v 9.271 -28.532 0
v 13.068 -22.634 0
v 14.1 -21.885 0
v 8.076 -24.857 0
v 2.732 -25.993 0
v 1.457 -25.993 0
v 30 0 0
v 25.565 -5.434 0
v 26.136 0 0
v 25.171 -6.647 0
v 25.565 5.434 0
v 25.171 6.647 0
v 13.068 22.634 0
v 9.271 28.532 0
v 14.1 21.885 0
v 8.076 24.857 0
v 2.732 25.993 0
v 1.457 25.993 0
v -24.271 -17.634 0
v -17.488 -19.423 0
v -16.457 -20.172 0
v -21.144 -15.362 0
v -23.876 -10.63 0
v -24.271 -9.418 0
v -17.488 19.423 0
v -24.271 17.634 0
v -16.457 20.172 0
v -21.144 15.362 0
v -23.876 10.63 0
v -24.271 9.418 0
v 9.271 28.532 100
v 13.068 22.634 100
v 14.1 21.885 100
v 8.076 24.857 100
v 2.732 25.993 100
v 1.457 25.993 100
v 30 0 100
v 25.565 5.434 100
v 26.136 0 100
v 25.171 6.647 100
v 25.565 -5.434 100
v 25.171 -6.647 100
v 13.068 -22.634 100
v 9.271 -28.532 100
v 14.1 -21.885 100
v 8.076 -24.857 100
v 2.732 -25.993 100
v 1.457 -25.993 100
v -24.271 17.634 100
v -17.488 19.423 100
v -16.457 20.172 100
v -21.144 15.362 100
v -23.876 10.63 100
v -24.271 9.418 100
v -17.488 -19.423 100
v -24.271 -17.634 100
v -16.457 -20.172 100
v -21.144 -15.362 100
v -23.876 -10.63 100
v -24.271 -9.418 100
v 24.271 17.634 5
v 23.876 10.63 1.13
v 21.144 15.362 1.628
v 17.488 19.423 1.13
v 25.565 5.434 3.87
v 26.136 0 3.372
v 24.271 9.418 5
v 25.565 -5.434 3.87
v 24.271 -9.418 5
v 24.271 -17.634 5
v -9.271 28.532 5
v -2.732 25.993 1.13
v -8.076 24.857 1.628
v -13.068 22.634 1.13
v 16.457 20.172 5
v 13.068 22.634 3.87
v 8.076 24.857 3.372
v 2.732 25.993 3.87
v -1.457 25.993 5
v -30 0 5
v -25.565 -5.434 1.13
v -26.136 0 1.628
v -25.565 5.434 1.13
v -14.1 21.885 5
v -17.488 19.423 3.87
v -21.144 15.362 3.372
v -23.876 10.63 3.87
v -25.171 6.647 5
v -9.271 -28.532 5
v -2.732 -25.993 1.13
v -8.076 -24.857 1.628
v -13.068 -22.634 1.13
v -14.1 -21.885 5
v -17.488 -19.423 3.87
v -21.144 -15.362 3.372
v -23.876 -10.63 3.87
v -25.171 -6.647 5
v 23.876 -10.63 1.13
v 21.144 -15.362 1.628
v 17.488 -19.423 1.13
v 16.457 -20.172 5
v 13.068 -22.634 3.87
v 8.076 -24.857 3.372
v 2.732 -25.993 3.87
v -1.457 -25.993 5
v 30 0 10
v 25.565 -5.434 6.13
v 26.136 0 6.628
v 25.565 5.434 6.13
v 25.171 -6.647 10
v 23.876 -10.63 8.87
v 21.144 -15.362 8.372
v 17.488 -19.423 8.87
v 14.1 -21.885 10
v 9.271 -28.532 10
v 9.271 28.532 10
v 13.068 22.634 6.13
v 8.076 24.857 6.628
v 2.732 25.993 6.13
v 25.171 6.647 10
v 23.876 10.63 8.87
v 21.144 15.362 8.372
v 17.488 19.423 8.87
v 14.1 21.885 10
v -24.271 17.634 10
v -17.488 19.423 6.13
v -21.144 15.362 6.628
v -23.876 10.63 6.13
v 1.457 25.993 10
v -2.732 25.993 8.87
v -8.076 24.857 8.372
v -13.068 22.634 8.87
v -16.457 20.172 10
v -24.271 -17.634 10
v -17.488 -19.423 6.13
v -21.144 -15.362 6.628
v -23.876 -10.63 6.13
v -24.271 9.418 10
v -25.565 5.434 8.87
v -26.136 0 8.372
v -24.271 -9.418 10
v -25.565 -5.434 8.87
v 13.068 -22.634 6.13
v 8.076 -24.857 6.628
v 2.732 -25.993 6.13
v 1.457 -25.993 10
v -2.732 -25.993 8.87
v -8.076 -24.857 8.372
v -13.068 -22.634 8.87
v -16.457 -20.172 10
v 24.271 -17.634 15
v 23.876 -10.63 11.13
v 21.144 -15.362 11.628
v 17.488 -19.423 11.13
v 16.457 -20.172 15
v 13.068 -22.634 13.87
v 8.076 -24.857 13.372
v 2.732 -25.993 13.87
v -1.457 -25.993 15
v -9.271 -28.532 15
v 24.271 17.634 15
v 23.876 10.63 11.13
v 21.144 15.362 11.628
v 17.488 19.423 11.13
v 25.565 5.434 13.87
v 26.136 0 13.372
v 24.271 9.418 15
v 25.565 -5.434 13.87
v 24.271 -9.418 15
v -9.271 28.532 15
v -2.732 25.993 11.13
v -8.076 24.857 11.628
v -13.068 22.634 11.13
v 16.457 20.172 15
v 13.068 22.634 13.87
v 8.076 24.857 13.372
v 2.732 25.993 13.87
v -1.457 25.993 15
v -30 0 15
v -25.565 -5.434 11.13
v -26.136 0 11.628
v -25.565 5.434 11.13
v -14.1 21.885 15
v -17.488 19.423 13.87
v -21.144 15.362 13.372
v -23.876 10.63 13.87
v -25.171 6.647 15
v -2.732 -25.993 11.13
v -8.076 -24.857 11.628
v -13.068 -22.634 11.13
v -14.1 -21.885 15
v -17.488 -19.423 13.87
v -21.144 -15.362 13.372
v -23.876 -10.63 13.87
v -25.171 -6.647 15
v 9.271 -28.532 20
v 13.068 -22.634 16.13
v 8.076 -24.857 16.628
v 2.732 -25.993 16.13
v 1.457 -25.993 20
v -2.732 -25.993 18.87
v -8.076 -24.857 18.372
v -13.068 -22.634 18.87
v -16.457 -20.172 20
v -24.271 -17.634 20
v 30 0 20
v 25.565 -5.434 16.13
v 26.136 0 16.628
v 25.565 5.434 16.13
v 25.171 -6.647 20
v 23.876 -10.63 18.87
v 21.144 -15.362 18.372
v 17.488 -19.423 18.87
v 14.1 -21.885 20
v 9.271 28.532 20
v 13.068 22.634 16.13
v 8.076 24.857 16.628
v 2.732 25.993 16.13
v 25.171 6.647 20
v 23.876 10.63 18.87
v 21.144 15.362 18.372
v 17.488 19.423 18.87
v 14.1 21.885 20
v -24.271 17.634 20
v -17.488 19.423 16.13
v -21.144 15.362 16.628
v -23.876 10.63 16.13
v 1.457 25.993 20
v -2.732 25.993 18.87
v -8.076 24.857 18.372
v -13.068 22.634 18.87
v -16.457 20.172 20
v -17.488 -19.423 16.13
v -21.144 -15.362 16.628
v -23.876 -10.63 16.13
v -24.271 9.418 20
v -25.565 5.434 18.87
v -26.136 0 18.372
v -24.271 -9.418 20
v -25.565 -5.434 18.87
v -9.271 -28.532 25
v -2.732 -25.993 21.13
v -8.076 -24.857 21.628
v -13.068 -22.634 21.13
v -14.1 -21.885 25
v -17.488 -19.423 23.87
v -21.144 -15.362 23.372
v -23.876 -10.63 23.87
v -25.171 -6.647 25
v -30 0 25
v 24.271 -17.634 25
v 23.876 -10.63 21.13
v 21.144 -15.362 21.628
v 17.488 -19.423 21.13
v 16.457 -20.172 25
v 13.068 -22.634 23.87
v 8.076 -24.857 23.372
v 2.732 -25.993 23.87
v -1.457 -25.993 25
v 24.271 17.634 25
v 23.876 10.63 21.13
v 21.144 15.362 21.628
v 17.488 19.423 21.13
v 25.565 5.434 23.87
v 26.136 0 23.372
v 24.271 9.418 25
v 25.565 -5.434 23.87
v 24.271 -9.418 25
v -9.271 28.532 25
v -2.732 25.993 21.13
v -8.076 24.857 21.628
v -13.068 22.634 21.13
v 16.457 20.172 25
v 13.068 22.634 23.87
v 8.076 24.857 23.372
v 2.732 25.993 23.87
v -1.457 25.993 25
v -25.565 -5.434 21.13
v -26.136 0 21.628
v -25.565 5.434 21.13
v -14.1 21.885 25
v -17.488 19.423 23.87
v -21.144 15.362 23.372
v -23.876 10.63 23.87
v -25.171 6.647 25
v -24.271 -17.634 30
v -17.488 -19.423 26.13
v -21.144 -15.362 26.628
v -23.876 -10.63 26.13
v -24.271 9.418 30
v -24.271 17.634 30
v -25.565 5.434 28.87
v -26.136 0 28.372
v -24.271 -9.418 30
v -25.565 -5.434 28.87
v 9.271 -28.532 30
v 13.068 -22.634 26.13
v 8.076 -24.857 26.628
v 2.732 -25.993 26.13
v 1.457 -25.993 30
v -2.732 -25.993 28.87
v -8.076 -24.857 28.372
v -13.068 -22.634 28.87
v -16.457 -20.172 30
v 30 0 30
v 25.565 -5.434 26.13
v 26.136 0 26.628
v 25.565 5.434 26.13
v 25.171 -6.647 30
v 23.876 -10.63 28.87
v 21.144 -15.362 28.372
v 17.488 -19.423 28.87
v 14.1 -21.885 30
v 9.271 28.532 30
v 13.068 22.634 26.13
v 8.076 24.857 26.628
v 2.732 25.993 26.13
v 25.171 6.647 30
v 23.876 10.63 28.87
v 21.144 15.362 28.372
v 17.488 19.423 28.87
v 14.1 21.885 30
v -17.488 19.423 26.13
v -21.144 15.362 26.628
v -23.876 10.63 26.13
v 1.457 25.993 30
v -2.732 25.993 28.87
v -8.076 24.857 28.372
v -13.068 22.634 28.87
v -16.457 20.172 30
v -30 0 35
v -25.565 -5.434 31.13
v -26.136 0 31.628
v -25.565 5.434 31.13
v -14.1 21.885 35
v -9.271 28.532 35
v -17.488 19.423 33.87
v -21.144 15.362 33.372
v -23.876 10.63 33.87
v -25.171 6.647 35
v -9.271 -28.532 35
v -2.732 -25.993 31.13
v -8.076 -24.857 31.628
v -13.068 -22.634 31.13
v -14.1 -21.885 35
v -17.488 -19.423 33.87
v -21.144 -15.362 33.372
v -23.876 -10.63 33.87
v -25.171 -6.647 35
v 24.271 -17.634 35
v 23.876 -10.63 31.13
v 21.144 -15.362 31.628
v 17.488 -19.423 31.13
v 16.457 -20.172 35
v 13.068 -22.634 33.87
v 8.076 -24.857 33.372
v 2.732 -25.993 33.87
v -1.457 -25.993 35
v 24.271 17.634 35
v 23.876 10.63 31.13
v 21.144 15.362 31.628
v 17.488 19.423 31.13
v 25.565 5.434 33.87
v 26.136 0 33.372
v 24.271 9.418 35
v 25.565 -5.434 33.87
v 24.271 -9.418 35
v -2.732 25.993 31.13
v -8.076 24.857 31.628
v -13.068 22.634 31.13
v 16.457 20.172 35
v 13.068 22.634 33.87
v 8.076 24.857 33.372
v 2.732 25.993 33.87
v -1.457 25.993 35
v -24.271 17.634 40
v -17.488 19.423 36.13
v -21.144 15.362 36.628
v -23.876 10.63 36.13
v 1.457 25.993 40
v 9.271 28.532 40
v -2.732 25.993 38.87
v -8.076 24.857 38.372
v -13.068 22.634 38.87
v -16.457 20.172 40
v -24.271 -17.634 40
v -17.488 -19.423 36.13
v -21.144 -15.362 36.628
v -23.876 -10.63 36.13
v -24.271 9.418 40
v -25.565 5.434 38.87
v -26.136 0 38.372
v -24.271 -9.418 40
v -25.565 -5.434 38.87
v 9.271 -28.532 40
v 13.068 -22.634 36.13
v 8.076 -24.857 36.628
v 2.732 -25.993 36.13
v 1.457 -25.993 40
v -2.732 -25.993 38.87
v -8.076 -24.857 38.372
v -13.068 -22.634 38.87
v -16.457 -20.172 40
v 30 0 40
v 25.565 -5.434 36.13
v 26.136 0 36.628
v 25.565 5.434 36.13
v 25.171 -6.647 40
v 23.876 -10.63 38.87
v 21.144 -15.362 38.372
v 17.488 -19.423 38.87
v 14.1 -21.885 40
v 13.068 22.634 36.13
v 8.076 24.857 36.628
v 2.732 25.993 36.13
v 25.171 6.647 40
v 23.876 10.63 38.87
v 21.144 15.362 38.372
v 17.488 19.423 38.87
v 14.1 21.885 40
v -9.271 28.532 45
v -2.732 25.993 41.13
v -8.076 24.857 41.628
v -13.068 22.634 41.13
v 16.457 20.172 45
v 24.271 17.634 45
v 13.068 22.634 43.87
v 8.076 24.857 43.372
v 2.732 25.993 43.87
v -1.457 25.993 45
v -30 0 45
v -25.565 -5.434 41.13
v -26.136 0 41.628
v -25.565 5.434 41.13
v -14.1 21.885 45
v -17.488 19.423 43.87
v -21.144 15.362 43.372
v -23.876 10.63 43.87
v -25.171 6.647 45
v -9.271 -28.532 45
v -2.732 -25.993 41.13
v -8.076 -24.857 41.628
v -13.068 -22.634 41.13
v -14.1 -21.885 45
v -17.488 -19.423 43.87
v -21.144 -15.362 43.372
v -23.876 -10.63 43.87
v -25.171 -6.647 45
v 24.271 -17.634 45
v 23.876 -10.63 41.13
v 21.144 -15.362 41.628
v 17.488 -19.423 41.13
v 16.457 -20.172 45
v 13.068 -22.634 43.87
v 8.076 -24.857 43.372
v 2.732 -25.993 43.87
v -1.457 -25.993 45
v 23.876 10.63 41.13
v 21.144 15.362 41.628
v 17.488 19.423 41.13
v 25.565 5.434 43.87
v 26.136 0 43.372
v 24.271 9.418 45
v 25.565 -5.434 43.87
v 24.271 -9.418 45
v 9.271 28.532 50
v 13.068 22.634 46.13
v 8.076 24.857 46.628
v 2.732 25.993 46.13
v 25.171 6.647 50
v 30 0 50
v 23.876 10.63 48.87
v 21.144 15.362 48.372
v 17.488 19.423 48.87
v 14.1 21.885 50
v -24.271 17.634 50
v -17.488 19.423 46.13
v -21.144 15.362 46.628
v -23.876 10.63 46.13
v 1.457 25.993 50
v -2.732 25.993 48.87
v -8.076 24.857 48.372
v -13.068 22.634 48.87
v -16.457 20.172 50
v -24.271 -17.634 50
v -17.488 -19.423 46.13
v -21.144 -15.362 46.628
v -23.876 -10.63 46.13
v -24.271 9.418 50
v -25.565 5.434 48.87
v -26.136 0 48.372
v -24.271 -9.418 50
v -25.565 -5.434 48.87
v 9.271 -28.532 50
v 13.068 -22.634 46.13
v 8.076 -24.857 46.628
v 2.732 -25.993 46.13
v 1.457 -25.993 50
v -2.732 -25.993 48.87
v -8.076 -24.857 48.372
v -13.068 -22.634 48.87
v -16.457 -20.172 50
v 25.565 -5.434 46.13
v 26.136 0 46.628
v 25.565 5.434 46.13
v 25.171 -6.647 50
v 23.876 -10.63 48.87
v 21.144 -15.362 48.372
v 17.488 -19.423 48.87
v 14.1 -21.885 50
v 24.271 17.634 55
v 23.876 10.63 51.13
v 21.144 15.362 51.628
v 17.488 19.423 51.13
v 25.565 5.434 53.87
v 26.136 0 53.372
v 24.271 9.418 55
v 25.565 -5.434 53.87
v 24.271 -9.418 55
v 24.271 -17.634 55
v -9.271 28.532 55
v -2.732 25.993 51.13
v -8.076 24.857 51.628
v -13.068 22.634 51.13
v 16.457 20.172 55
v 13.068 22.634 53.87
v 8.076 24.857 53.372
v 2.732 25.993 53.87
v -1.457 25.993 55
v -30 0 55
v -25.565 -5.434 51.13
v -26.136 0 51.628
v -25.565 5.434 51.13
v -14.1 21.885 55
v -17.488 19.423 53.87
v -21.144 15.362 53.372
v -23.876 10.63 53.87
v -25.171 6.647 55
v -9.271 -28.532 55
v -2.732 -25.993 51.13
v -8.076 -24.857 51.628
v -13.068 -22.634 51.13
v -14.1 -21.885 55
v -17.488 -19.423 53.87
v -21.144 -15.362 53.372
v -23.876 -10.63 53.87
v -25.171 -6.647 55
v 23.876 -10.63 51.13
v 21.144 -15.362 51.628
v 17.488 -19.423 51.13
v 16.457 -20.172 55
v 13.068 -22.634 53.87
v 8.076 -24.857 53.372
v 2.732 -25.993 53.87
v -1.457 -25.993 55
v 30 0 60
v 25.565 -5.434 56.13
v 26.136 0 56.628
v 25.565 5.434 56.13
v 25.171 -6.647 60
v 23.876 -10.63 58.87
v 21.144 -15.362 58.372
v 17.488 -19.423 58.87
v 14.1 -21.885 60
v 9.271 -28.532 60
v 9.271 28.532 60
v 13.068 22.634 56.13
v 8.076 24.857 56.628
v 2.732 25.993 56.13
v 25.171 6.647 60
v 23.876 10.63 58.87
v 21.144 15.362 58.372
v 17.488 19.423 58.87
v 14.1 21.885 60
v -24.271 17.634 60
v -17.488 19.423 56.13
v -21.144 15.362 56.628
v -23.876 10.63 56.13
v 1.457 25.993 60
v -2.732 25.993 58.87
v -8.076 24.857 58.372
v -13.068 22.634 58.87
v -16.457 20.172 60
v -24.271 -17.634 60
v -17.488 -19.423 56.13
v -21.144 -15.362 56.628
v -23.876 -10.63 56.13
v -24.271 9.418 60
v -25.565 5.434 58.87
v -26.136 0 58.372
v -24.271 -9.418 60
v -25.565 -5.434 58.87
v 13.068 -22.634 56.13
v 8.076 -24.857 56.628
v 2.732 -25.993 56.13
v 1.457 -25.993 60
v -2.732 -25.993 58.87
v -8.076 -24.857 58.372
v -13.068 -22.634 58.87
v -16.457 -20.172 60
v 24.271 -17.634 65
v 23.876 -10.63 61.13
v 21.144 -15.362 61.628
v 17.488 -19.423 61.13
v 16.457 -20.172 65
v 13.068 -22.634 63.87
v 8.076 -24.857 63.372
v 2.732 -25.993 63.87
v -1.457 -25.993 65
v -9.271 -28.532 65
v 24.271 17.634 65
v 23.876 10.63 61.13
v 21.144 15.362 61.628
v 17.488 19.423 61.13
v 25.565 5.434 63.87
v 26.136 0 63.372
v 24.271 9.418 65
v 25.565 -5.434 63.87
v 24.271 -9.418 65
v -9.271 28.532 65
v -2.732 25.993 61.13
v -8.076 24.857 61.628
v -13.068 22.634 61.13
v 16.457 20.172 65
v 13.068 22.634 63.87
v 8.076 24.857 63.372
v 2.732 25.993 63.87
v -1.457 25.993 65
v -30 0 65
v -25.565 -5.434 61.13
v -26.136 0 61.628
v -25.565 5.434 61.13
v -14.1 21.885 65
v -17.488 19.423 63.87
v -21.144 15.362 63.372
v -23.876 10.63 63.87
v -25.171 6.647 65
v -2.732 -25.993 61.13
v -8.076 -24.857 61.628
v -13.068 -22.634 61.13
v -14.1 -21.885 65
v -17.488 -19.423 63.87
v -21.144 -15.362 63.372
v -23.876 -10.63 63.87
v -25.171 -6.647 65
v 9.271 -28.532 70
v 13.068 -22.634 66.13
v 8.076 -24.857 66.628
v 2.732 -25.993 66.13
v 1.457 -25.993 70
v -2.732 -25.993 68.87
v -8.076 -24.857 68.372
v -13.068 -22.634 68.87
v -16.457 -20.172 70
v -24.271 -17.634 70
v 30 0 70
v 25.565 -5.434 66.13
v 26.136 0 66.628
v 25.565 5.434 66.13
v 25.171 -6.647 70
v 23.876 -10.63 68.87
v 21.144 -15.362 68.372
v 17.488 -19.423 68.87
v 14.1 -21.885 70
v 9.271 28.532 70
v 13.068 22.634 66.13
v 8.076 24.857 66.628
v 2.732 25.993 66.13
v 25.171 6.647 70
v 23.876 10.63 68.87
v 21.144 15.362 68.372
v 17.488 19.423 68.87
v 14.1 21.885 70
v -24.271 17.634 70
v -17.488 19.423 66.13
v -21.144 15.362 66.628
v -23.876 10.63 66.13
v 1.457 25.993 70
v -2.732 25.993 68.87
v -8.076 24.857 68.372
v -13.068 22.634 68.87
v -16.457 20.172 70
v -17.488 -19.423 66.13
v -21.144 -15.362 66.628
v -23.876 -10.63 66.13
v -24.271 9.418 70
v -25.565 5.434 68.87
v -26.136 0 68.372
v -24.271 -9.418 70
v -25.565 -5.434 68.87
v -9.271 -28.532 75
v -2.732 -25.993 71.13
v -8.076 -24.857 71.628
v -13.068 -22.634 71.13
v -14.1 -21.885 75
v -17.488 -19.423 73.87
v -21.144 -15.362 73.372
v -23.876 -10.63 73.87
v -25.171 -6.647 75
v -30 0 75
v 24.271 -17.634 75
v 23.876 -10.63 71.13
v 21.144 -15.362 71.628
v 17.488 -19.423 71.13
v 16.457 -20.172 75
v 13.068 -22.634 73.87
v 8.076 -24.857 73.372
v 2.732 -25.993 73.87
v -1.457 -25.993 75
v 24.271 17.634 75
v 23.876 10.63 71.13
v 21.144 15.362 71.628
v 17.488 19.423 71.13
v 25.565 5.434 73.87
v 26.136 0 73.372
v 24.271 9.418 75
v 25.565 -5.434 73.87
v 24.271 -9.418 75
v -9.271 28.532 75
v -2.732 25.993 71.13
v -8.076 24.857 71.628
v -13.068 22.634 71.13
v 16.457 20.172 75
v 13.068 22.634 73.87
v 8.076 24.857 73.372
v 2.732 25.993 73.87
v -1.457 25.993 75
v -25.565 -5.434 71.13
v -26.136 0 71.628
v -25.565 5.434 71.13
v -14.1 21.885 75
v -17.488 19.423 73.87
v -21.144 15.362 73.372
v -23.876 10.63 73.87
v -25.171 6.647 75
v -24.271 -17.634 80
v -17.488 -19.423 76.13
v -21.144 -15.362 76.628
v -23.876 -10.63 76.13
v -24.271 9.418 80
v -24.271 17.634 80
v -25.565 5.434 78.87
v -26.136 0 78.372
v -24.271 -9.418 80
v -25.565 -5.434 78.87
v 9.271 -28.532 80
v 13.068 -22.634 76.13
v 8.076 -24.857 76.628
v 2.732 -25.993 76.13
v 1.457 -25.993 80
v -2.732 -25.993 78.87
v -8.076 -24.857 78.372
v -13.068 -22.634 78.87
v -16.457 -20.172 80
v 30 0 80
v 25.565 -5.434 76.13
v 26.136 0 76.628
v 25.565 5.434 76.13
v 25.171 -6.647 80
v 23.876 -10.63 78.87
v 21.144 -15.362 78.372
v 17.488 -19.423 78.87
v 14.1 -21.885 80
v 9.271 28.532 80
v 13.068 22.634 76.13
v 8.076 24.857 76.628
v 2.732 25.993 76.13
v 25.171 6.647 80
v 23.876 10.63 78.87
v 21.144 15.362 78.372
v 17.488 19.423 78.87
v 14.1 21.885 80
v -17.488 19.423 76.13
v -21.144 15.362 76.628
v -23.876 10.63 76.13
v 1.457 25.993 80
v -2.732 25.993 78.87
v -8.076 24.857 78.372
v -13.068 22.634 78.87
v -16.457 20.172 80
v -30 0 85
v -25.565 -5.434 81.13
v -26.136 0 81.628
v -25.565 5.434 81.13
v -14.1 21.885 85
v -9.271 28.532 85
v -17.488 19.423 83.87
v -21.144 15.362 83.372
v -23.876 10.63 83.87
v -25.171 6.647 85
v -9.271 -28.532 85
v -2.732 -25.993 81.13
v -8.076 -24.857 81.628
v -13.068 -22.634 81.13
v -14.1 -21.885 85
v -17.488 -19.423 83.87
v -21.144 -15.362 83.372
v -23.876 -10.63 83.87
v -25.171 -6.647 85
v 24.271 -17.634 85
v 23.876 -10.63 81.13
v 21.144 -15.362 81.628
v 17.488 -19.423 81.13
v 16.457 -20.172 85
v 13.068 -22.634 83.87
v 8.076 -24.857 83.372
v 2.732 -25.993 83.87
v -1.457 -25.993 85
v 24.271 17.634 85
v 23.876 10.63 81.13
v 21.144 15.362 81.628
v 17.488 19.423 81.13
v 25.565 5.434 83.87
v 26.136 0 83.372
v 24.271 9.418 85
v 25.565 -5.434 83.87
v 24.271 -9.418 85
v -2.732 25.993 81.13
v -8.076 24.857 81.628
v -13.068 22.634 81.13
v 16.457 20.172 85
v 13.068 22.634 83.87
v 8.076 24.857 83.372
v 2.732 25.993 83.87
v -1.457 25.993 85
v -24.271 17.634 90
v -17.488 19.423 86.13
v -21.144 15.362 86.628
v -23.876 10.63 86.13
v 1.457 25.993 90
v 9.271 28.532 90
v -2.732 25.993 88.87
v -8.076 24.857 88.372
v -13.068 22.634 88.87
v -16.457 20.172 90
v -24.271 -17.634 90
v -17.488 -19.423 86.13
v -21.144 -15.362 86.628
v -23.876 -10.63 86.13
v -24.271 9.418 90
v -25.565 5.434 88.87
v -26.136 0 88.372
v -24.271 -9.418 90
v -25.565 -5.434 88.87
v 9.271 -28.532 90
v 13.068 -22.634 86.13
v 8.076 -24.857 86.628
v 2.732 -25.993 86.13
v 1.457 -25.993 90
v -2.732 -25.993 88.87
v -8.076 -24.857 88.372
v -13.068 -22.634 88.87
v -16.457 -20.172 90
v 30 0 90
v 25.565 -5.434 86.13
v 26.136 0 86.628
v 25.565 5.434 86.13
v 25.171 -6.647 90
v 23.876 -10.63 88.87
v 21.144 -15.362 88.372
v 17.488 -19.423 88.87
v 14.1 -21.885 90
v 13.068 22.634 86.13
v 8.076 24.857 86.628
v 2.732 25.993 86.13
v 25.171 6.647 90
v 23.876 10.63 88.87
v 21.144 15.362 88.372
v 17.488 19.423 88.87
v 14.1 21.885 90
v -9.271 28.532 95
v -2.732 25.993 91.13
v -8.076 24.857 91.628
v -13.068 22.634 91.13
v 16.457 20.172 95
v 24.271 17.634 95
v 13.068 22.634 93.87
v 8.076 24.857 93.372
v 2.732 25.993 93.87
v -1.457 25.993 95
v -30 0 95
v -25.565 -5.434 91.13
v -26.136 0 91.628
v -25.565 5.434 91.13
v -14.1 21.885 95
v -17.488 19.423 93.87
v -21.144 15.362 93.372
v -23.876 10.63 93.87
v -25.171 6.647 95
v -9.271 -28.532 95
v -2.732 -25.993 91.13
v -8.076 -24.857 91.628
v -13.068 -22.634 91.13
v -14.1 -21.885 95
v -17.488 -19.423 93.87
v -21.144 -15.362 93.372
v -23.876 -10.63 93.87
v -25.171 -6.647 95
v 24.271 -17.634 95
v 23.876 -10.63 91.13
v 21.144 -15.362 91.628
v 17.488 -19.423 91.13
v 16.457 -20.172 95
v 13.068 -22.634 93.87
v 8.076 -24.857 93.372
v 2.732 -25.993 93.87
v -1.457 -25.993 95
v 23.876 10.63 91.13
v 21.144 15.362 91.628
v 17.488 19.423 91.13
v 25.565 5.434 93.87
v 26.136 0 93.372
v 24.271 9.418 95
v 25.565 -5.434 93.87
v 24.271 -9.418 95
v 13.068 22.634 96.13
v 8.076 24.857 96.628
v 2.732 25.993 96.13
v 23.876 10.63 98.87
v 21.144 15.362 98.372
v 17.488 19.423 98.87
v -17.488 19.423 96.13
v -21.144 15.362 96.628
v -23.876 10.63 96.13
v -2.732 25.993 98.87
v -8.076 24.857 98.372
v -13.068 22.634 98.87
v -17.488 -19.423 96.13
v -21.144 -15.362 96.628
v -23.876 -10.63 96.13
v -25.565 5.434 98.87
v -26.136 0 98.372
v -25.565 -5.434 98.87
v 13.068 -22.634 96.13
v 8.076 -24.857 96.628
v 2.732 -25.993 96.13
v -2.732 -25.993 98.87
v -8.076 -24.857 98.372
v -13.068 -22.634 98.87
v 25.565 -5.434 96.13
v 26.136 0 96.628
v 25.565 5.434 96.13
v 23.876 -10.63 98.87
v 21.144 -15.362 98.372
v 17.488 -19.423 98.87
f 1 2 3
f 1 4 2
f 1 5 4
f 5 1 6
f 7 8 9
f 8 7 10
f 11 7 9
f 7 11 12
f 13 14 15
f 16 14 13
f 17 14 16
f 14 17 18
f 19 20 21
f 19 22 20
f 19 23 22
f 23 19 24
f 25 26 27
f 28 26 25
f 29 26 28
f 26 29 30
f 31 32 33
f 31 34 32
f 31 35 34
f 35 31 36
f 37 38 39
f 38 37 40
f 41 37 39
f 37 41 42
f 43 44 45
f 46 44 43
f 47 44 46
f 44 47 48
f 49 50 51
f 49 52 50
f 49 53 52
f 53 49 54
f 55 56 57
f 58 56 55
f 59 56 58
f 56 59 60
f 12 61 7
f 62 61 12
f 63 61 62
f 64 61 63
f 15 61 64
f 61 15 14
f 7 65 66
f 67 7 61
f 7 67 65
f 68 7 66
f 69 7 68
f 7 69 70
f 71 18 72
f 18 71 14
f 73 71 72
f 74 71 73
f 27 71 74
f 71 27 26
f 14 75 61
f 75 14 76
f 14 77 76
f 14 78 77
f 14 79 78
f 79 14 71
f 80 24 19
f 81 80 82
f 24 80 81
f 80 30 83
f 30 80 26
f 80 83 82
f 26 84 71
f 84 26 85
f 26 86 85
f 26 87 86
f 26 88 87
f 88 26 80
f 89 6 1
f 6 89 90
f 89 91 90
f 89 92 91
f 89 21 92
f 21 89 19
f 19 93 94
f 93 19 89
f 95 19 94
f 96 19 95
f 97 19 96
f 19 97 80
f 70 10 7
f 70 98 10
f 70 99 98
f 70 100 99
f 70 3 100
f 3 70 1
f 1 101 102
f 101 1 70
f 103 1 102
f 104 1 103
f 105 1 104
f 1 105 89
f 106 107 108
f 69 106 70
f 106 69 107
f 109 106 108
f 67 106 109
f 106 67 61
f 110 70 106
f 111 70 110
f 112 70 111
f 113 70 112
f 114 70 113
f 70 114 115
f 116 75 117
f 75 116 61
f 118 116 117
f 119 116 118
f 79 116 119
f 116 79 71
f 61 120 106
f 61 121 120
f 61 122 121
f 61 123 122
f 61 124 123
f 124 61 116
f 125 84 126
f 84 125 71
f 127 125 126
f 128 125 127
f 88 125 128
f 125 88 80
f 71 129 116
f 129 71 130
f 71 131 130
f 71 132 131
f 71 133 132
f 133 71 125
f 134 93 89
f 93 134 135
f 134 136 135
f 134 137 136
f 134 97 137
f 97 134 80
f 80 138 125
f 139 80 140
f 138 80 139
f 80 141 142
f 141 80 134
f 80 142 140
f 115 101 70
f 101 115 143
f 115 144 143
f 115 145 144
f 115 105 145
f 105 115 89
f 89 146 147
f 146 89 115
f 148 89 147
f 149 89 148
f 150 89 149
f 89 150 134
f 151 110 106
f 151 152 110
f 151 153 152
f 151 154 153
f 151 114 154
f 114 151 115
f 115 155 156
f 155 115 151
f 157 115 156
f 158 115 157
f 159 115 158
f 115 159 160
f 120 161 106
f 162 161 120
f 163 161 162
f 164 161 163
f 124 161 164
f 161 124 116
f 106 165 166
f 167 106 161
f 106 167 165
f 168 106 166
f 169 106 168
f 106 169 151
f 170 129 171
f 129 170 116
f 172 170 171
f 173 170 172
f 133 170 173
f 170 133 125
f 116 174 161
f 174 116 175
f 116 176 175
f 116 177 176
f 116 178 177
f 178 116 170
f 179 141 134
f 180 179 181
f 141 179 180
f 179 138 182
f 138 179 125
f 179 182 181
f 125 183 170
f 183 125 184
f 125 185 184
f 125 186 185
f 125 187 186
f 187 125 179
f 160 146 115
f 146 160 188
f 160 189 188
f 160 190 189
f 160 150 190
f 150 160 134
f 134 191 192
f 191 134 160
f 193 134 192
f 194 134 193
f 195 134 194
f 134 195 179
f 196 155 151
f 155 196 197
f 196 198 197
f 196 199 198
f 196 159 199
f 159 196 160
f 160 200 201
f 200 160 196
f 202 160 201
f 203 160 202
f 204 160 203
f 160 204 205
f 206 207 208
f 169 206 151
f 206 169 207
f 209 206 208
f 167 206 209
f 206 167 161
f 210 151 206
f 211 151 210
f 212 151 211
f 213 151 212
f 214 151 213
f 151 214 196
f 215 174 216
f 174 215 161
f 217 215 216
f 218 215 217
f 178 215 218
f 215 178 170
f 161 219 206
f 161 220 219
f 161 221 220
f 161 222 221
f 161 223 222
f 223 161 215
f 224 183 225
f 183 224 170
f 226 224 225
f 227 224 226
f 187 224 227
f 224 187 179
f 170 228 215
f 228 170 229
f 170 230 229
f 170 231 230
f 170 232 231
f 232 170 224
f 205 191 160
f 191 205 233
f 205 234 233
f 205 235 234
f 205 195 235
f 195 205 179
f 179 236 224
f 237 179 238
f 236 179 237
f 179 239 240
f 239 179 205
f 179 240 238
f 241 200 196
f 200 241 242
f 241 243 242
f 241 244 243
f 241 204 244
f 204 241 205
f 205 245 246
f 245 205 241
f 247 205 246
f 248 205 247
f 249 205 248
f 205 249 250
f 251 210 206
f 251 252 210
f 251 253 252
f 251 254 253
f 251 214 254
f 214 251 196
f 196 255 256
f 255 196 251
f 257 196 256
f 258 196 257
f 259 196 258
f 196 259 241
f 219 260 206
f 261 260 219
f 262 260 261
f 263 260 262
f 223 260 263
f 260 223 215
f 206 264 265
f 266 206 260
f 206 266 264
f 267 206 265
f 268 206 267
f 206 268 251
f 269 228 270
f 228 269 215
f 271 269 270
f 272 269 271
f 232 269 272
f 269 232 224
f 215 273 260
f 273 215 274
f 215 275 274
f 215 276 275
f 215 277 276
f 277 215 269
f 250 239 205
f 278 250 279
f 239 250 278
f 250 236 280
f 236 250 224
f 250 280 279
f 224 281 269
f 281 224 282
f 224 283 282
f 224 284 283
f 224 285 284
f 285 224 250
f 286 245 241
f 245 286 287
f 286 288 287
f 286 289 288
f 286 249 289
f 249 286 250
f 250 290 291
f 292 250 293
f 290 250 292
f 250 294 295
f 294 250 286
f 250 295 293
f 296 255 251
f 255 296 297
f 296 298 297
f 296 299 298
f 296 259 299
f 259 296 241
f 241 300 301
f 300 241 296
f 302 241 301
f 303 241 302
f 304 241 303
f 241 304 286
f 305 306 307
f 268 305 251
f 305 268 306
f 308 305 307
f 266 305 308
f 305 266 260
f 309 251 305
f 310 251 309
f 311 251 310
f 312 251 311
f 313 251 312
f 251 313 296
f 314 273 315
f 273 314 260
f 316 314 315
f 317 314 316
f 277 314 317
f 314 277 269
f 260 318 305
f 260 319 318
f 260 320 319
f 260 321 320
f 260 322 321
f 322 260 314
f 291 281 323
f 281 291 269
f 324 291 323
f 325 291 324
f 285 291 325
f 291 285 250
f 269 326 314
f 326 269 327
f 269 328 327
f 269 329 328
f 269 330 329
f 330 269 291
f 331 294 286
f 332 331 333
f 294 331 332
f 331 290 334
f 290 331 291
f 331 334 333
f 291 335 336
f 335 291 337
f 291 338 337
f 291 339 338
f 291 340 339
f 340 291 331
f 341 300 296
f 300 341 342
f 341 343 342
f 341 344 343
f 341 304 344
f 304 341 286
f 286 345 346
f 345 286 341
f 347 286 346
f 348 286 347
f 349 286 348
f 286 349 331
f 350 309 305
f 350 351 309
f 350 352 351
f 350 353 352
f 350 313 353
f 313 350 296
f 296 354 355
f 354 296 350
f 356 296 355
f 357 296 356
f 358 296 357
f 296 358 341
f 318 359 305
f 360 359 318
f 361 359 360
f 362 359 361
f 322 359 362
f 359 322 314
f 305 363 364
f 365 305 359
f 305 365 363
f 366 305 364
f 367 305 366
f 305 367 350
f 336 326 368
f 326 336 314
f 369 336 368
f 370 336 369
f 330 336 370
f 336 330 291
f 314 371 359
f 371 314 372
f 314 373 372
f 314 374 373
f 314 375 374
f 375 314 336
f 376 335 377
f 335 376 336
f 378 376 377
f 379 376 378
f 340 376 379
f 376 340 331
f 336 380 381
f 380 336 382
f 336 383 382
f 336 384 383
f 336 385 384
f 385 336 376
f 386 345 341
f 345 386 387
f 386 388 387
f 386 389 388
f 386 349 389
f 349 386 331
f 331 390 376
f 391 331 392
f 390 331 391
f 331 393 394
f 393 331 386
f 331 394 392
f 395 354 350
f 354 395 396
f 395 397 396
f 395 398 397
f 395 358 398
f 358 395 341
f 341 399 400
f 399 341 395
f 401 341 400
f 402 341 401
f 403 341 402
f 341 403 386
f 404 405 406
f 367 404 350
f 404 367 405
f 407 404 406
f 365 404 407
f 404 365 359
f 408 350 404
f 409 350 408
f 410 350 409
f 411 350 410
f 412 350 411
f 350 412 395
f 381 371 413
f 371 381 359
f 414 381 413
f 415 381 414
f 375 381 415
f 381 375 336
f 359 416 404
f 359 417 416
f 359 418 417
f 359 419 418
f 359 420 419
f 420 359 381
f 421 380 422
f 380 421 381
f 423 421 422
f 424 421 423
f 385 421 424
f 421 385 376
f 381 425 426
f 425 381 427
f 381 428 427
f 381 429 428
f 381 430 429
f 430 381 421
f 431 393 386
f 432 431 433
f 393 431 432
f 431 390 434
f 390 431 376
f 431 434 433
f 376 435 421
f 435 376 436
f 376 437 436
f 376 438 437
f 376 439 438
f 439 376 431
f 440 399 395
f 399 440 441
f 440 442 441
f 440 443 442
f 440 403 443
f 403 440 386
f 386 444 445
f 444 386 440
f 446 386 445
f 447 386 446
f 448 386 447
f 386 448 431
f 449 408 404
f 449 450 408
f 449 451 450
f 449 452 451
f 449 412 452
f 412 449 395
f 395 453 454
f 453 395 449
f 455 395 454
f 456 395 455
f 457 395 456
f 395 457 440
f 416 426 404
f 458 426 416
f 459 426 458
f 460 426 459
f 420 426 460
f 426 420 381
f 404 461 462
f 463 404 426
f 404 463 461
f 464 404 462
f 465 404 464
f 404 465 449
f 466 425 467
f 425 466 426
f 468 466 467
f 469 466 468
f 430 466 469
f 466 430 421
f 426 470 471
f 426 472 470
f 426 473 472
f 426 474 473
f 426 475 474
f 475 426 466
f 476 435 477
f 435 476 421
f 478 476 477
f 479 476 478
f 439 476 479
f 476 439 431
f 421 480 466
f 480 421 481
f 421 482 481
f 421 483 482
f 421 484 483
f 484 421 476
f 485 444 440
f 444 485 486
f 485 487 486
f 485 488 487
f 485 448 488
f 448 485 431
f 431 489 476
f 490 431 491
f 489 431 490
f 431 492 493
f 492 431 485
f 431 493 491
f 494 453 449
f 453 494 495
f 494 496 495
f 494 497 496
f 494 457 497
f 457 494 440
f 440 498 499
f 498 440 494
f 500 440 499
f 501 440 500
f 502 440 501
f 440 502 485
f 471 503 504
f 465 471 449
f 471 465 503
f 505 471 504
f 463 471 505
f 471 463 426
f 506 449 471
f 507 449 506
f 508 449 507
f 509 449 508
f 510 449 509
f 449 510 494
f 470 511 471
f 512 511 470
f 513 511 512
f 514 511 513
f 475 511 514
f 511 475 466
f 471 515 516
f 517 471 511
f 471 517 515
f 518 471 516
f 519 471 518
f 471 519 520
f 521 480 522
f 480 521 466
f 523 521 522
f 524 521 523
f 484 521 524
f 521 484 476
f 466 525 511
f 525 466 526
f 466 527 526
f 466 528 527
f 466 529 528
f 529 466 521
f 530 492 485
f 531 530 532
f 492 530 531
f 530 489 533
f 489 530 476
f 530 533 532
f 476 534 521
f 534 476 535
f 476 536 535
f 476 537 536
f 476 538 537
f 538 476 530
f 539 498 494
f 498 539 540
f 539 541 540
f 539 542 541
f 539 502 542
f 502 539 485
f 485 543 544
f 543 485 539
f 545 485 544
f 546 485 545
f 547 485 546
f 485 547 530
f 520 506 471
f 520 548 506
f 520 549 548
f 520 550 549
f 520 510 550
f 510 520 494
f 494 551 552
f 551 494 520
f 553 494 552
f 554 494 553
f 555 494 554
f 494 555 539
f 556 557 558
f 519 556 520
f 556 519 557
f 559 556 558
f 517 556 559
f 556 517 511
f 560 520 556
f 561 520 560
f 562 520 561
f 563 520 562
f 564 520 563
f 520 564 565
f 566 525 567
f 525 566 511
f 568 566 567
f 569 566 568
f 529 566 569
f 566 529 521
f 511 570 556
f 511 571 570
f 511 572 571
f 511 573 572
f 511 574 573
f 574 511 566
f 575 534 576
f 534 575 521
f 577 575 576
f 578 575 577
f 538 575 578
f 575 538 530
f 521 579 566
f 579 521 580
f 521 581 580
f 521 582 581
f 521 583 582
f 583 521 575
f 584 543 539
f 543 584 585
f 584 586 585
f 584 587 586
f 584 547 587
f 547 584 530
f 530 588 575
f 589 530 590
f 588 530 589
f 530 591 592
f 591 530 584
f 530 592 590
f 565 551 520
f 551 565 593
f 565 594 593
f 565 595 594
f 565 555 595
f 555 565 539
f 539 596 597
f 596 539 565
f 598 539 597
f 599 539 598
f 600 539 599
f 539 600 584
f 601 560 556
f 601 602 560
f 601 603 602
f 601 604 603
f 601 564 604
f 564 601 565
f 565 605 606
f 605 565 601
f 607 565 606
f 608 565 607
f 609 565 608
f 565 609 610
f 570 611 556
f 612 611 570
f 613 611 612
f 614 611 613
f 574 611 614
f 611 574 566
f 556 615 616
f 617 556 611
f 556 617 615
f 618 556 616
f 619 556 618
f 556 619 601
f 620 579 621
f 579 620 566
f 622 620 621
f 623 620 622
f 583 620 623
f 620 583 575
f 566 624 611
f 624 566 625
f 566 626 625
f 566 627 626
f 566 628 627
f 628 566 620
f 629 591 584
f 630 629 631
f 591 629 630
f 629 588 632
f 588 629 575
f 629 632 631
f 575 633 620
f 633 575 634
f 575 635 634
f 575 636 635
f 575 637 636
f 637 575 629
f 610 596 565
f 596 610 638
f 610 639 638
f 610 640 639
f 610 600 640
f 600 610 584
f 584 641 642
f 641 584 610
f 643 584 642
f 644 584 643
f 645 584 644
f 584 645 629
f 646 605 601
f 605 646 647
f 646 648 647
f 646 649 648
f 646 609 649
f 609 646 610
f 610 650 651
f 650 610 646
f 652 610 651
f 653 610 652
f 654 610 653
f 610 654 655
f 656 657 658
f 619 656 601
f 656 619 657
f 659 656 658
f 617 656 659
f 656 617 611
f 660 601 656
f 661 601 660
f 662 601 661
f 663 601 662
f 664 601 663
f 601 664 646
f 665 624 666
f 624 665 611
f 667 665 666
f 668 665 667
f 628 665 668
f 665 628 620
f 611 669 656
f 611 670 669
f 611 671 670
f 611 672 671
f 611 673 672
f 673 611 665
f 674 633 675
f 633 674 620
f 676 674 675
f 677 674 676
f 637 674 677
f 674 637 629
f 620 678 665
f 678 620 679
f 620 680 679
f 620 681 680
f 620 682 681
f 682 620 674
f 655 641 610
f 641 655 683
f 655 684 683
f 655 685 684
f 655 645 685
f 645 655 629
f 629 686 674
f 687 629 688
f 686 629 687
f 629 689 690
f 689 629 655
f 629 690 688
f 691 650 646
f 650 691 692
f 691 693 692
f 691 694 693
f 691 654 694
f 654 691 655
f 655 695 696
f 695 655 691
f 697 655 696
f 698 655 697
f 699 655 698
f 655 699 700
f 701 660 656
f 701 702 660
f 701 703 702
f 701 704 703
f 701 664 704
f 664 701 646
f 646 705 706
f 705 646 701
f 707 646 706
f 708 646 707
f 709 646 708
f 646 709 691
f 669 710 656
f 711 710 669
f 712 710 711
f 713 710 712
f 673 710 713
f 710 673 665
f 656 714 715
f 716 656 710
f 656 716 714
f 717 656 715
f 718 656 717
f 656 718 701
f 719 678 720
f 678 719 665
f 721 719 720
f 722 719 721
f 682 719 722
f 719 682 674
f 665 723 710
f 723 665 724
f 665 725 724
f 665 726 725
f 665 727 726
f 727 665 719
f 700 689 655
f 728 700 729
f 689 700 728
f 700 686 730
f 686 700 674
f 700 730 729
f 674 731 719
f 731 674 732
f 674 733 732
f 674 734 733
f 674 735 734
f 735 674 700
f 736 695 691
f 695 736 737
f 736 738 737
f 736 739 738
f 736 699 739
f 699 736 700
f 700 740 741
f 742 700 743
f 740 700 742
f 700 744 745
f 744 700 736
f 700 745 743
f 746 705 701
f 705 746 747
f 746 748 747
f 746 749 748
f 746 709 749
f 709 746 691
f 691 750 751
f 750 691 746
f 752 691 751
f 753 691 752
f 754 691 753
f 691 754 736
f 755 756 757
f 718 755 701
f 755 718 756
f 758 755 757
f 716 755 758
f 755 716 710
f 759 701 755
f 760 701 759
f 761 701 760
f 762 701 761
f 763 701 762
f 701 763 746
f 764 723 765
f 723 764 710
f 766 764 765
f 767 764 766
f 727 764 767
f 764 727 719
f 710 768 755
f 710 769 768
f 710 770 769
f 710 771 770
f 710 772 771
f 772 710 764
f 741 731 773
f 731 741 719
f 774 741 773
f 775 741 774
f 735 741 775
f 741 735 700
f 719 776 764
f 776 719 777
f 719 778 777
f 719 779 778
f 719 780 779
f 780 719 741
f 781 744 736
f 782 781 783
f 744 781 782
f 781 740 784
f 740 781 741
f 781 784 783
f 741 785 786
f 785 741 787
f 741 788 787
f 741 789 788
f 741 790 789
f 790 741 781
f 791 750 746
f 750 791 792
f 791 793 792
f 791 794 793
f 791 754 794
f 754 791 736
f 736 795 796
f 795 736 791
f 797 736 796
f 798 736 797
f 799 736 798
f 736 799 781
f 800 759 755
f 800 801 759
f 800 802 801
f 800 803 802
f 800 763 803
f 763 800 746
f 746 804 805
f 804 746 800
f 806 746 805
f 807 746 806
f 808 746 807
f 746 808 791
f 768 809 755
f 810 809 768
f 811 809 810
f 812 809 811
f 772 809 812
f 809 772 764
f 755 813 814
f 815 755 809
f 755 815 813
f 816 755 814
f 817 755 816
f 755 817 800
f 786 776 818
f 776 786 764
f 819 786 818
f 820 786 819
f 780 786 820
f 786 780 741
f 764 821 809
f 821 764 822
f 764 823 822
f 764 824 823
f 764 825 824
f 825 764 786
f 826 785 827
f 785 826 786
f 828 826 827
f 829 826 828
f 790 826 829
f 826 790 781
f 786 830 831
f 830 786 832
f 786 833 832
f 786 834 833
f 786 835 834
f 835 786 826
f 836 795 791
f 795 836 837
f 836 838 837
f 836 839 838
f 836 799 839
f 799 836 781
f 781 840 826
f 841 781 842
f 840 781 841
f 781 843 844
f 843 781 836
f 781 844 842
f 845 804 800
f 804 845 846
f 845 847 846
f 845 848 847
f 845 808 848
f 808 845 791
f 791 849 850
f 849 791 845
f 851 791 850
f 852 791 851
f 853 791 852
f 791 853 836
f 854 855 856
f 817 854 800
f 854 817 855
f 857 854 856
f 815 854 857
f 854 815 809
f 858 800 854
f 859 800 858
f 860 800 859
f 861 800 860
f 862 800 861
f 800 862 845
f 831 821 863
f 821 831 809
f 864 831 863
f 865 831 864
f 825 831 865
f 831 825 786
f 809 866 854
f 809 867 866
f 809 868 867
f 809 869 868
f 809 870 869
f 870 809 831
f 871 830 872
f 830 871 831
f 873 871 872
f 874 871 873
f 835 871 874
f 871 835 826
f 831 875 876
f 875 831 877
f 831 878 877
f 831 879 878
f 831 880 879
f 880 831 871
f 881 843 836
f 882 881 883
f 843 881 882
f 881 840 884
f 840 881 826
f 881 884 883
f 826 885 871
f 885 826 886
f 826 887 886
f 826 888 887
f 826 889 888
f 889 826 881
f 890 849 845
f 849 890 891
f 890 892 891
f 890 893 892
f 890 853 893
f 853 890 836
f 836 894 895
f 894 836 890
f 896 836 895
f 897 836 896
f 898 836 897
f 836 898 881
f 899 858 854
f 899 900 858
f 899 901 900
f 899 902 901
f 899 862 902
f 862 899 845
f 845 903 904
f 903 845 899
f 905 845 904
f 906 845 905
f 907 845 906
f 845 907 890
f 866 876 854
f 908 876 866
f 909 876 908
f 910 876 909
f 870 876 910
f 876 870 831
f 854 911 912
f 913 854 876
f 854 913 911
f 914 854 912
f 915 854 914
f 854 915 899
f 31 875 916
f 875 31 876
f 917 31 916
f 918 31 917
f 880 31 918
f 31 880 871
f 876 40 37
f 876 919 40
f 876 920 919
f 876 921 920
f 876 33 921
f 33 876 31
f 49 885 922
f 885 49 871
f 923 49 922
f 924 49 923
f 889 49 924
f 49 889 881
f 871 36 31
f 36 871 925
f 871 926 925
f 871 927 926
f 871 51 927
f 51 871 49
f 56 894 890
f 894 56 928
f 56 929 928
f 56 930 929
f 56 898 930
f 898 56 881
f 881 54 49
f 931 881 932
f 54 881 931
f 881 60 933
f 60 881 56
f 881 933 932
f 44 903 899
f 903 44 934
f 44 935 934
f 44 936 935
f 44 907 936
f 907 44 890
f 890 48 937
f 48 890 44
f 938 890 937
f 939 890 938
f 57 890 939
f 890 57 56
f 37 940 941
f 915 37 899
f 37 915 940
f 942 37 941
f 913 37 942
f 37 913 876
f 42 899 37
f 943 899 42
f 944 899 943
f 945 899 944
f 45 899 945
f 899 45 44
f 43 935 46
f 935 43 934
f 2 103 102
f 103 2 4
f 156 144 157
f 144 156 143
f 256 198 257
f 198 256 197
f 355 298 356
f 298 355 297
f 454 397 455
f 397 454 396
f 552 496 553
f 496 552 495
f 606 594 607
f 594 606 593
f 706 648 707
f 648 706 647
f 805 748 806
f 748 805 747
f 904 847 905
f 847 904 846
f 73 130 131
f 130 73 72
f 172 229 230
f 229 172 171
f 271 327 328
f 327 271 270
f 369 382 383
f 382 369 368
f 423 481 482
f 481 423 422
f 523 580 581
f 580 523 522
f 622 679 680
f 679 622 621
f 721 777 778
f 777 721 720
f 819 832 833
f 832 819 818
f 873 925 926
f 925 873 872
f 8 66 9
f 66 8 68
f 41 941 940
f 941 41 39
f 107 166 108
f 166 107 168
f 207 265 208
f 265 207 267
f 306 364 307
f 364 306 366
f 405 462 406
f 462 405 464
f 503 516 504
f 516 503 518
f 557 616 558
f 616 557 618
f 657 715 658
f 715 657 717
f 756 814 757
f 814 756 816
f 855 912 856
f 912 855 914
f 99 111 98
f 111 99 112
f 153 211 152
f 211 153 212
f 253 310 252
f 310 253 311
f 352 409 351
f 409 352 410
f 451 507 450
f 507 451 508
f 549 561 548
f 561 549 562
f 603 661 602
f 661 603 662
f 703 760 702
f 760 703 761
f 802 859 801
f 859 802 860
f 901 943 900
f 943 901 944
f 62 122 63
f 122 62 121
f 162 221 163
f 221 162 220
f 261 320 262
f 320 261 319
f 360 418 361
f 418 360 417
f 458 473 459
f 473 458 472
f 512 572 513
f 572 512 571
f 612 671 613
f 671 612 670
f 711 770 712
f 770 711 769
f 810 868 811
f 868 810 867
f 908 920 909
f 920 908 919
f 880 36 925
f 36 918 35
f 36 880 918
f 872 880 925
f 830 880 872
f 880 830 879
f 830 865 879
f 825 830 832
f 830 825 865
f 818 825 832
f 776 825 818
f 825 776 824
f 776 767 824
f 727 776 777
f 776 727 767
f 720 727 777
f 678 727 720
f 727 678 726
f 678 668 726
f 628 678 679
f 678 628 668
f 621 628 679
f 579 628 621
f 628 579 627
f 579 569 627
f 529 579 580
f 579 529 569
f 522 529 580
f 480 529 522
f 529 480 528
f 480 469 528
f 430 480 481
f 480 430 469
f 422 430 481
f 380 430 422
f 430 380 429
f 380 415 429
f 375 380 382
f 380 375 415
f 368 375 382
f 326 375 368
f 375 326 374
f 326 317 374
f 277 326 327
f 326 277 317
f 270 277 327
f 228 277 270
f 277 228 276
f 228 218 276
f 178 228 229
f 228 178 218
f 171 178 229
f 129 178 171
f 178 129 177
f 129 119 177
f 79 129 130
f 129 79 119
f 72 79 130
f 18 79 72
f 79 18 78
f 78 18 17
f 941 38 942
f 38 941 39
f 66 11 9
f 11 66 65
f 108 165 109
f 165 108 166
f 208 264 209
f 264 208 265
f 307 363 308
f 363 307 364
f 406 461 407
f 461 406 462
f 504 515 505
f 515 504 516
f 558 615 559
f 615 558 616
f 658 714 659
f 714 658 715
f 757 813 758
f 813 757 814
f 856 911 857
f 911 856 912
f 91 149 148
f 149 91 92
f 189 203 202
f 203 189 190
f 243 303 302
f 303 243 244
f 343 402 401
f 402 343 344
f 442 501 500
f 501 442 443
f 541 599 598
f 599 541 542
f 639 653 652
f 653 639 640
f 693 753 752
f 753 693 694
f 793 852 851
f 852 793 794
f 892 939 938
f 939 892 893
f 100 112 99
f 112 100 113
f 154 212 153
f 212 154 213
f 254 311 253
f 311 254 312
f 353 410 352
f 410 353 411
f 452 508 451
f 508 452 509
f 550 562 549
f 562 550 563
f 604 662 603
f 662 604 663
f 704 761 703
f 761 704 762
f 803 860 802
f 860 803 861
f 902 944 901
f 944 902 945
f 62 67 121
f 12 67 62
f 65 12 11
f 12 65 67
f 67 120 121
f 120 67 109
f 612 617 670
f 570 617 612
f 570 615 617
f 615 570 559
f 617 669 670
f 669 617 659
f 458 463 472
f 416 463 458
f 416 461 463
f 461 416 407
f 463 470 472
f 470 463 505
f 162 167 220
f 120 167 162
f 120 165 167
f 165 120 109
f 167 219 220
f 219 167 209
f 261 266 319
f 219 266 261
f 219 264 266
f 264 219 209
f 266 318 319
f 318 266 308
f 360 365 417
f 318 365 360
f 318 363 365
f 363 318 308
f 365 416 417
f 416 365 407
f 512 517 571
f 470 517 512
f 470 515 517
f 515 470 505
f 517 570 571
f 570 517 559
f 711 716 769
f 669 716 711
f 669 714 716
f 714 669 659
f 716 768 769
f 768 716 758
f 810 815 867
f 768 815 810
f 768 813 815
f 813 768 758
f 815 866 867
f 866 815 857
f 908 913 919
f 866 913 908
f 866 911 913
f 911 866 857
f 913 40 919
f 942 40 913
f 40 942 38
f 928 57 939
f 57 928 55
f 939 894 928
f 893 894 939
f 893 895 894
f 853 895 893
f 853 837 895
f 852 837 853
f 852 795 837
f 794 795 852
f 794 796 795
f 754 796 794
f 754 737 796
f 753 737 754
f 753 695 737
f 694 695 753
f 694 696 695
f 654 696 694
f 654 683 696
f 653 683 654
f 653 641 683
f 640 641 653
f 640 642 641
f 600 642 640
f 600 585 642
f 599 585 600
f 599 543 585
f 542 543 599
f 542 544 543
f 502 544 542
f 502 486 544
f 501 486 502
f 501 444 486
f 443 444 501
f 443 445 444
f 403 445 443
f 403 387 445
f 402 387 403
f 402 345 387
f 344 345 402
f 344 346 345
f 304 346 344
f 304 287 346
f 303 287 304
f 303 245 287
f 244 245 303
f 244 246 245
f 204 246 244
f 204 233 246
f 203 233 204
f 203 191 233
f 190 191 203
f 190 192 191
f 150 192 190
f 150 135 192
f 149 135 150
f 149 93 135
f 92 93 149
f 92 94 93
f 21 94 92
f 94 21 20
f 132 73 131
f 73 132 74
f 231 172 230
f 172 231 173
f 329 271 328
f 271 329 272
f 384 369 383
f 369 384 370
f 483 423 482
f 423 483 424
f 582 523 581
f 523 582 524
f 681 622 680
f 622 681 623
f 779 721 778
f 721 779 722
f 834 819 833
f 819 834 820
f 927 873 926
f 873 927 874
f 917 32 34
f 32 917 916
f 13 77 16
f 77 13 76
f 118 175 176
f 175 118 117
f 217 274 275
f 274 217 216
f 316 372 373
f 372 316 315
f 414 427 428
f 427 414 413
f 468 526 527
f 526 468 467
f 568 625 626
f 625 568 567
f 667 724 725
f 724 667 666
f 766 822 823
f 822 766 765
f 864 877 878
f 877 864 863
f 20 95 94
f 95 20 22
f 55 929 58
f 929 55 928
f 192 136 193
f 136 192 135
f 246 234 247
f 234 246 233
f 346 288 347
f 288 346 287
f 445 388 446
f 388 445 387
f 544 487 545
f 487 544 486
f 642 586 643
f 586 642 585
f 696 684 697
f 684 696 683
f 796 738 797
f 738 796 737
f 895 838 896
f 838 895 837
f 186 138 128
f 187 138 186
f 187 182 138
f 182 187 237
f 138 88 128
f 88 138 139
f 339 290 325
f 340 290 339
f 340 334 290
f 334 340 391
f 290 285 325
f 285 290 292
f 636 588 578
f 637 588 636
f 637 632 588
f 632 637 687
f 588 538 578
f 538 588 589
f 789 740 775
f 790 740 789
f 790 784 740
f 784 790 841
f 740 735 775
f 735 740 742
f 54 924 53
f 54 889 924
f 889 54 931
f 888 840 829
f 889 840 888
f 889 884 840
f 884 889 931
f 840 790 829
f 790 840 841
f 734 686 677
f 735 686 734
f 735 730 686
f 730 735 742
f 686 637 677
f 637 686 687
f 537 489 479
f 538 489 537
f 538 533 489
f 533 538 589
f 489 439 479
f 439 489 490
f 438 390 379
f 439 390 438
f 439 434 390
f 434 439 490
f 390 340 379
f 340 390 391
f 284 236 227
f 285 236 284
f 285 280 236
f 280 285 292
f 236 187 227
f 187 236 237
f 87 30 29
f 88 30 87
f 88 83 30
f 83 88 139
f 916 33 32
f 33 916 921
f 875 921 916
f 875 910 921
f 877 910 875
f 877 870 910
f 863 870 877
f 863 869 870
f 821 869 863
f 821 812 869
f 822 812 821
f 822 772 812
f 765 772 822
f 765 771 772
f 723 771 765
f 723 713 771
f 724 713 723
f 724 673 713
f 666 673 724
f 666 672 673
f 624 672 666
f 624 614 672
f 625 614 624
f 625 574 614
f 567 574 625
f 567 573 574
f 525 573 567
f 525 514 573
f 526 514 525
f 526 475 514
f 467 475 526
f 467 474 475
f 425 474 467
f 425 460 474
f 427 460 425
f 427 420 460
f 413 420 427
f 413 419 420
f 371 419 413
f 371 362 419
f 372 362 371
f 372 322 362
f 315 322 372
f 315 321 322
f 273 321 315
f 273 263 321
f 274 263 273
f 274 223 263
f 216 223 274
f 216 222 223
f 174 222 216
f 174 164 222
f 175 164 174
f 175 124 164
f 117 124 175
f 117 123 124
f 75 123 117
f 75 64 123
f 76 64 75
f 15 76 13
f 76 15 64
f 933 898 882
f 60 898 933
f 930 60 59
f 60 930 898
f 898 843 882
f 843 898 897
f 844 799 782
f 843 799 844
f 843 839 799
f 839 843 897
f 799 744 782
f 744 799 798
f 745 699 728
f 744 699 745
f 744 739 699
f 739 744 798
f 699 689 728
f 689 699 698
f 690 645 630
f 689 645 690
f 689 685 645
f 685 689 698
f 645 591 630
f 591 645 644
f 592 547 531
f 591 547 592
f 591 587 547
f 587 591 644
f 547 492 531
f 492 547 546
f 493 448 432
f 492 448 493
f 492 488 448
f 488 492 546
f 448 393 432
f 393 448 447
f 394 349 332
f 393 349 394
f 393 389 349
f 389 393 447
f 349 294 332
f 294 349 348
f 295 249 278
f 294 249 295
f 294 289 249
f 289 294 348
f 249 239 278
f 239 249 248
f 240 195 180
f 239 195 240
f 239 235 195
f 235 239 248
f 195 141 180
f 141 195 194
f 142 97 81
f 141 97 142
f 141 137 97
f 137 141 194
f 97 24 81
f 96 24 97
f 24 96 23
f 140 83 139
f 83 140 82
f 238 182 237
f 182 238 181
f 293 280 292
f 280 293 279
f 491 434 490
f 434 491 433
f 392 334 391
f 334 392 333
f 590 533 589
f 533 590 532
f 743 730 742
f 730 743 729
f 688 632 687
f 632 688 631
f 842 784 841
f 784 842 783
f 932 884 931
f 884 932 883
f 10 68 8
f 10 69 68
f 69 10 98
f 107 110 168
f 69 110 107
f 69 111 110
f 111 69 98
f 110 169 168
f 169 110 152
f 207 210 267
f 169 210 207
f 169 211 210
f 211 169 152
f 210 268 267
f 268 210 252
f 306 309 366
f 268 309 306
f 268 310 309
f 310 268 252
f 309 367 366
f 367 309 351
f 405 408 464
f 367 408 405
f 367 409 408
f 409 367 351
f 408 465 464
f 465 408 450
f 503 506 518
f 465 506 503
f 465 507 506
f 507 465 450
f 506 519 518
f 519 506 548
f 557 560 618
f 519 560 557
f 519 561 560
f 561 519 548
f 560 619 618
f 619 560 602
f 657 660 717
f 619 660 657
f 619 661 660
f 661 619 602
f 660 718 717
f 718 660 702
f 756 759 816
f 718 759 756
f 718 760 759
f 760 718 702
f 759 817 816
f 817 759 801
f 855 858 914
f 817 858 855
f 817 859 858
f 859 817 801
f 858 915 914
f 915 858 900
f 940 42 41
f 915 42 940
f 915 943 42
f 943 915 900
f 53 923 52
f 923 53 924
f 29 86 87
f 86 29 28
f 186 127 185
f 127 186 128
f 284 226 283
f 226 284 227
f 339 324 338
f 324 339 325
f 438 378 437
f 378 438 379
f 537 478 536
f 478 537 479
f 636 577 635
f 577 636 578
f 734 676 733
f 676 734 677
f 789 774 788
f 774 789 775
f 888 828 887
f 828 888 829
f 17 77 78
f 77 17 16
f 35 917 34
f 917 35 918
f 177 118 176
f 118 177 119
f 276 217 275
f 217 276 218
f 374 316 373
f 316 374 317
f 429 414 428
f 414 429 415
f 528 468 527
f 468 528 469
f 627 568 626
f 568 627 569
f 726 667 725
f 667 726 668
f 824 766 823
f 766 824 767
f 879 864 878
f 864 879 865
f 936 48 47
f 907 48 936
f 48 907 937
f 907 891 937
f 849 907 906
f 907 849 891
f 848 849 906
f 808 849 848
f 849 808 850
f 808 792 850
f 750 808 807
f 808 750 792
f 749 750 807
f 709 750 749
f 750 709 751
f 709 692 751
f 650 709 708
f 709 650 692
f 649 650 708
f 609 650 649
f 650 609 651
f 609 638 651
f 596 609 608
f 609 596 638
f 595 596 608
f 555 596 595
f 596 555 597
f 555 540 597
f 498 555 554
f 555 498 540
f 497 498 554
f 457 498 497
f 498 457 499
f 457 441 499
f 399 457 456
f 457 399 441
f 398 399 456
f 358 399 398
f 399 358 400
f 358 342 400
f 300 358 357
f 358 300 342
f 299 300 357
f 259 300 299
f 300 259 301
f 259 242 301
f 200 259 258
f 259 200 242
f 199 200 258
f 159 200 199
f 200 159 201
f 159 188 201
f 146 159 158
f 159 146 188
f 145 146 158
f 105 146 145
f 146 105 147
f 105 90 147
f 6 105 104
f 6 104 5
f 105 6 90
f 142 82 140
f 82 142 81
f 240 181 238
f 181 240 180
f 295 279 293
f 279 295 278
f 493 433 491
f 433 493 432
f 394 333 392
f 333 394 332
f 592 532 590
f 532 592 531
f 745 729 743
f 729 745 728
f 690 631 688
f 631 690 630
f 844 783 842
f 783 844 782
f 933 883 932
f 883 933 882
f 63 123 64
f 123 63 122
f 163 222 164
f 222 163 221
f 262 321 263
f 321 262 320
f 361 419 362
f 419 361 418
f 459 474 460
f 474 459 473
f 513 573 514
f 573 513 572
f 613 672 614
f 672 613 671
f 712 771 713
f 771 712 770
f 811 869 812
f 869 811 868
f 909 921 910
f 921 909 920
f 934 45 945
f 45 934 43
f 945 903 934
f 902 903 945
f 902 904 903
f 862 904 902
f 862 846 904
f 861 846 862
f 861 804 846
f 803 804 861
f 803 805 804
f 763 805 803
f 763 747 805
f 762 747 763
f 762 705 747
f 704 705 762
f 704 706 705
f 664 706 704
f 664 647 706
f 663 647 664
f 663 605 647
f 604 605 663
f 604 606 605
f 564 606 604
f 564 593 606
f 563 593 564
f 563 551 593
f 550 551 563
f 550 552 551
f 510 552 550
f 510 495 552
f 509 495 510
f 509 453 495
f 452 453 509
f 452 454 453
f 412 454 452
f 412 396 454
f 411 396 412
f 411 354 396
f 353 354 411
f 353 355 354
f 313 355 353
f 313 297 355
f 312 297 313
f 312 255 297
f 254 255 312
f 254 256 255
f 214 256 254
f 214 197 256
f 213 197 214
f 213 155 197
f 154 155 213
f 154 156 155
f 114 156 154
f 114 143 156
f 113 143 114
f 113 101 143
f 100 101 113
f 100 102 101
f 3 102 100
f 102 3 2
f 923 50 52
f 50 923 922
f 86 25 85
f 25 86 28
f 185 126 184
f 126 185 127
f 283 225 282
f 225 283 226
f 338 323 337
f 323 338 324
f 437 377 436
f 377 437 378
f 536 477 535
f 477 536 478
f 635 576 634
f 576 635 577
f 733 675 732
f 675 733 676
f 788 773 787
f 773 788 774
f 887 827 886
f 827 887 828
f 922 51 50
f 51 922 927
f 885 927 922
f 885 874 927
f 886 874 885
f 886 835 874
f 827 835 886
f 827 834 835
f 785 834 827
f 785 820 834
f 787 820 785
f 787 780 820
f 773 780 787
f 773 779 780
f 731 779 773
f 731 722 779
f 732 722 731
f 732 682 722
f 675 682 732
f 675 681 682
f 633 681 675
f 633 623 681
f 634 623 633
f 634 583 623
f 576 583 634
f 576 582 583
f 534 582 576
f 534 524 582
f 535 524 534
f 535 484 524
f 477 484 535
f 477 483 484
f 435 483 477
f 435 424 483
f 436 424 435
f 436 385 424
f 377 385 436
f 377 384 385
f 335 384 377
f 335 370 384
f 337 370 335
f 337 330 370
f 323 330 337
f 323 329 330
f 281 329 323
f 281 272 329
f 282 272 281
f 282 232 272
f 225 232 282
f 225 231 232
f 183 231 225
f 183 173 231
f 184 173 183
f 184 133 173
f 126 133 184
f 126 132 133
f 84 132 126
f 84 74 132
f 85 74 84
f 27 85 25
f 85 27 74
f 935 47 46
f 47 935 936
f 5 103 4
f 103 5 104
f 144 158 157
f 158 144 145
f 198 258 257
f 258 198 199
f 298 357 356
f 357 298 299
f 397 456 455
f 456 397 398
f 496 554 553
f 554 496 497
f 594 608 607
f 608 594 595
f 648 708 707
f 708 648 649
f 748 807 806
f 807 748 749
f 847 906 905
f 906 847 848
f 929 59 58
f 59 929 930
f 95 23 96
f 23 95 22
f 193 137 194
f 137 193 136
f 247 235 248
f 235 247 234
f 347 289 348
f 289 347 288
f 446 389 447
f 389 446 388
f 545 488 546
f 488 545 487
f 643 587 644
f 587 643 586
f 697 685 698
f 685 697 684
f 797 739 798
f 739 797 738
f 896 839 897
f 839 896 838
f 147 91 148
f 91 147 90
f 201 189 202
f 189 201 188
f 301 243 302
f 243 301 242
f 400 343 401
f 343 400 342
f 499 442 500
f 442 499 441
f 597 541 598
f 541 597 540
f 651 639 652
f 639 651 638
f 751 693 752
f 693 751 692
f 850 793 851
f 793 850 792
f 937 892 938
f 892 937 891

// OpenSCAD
// 3-piece interference pattern vase or light shade
//   w/ base, insert and frame
//
// github.com/pchuck/generative-3d-models
//
radius = 30;
sides = 5;
height = 100;
center = true;
convexity = 10;
twist = 720;
scale = [2, 2];
fn=10;
unity = [1.0, 1.0];
margin = 0.01;
k = 0.88;
round = 5;
base_size = 1.2;
cable_diameter = 1.5;

steps = twist * fn / 360;
step_inc = height / steps;
twist_inc = twist / steps;
echo(steps);

module simple_extruded_vase(sides, twist, radius, offset, height, scale, r) {
    translate([0, 0, offset + height / 2])
        rotate(r)
        linear_extrude(height=height, 
                       center=center, 
                       convexity=convexity, 
                       twist=twist, 
                       scale=scale, 
                       $fn=fn)
            circle(r=radius, $fn=sides);
}

// opposing twisted extrusion, with constant radius
module frame() {
    difference() {
        union() {
            simple_extruded_vase(sides, twist, radius, 0, height, unity, [0, 0, 0]);
            simple_extruded_vase(sides, -twist, radius, 0, height, unity, [0, 0, 0]);
        }
    cylinder(r=radius * k * (1 - margin), h=height);
    }
}

// base - square
module base_square() {
    difference() {
        minkowski() {
            rotate([90, 0, 0]) cylinder(r=1, h=1);
            minkowski() {
                cylinder(r=round, h=1);
                translate([-radius * base_size, -radius * base_size, 0])
                    cube([radius * base_size * 2, radius * base_size * 2, 3]);
            }
        }
        cylinder(r=radius, h=height);
        translate([0, 0, 0])
            cube([radius * base_size * 2, cable_diameter, height]);
    }
}

// base - round
module base_round() {
    difference() {
        minkowski() {
            rotate([90, 0, 0]) cylinder(r=1, h=1);
            cylinder(r=radius*1.2, h=2);
        }
        translate([0, 0, 1]) cylinder(r=radius, h=height);
        translate([0, 0, 0]) cube([100, 1.5, 10]);
    }
}

// insert sleeve:
module sleeve() {
    cylinder(r=radius * 0.88 * 0.99, h=height);
}


// square or round base
//base_square();
//base_round();

// soft light insert filter
//sleeve();

// light frame
frame();
